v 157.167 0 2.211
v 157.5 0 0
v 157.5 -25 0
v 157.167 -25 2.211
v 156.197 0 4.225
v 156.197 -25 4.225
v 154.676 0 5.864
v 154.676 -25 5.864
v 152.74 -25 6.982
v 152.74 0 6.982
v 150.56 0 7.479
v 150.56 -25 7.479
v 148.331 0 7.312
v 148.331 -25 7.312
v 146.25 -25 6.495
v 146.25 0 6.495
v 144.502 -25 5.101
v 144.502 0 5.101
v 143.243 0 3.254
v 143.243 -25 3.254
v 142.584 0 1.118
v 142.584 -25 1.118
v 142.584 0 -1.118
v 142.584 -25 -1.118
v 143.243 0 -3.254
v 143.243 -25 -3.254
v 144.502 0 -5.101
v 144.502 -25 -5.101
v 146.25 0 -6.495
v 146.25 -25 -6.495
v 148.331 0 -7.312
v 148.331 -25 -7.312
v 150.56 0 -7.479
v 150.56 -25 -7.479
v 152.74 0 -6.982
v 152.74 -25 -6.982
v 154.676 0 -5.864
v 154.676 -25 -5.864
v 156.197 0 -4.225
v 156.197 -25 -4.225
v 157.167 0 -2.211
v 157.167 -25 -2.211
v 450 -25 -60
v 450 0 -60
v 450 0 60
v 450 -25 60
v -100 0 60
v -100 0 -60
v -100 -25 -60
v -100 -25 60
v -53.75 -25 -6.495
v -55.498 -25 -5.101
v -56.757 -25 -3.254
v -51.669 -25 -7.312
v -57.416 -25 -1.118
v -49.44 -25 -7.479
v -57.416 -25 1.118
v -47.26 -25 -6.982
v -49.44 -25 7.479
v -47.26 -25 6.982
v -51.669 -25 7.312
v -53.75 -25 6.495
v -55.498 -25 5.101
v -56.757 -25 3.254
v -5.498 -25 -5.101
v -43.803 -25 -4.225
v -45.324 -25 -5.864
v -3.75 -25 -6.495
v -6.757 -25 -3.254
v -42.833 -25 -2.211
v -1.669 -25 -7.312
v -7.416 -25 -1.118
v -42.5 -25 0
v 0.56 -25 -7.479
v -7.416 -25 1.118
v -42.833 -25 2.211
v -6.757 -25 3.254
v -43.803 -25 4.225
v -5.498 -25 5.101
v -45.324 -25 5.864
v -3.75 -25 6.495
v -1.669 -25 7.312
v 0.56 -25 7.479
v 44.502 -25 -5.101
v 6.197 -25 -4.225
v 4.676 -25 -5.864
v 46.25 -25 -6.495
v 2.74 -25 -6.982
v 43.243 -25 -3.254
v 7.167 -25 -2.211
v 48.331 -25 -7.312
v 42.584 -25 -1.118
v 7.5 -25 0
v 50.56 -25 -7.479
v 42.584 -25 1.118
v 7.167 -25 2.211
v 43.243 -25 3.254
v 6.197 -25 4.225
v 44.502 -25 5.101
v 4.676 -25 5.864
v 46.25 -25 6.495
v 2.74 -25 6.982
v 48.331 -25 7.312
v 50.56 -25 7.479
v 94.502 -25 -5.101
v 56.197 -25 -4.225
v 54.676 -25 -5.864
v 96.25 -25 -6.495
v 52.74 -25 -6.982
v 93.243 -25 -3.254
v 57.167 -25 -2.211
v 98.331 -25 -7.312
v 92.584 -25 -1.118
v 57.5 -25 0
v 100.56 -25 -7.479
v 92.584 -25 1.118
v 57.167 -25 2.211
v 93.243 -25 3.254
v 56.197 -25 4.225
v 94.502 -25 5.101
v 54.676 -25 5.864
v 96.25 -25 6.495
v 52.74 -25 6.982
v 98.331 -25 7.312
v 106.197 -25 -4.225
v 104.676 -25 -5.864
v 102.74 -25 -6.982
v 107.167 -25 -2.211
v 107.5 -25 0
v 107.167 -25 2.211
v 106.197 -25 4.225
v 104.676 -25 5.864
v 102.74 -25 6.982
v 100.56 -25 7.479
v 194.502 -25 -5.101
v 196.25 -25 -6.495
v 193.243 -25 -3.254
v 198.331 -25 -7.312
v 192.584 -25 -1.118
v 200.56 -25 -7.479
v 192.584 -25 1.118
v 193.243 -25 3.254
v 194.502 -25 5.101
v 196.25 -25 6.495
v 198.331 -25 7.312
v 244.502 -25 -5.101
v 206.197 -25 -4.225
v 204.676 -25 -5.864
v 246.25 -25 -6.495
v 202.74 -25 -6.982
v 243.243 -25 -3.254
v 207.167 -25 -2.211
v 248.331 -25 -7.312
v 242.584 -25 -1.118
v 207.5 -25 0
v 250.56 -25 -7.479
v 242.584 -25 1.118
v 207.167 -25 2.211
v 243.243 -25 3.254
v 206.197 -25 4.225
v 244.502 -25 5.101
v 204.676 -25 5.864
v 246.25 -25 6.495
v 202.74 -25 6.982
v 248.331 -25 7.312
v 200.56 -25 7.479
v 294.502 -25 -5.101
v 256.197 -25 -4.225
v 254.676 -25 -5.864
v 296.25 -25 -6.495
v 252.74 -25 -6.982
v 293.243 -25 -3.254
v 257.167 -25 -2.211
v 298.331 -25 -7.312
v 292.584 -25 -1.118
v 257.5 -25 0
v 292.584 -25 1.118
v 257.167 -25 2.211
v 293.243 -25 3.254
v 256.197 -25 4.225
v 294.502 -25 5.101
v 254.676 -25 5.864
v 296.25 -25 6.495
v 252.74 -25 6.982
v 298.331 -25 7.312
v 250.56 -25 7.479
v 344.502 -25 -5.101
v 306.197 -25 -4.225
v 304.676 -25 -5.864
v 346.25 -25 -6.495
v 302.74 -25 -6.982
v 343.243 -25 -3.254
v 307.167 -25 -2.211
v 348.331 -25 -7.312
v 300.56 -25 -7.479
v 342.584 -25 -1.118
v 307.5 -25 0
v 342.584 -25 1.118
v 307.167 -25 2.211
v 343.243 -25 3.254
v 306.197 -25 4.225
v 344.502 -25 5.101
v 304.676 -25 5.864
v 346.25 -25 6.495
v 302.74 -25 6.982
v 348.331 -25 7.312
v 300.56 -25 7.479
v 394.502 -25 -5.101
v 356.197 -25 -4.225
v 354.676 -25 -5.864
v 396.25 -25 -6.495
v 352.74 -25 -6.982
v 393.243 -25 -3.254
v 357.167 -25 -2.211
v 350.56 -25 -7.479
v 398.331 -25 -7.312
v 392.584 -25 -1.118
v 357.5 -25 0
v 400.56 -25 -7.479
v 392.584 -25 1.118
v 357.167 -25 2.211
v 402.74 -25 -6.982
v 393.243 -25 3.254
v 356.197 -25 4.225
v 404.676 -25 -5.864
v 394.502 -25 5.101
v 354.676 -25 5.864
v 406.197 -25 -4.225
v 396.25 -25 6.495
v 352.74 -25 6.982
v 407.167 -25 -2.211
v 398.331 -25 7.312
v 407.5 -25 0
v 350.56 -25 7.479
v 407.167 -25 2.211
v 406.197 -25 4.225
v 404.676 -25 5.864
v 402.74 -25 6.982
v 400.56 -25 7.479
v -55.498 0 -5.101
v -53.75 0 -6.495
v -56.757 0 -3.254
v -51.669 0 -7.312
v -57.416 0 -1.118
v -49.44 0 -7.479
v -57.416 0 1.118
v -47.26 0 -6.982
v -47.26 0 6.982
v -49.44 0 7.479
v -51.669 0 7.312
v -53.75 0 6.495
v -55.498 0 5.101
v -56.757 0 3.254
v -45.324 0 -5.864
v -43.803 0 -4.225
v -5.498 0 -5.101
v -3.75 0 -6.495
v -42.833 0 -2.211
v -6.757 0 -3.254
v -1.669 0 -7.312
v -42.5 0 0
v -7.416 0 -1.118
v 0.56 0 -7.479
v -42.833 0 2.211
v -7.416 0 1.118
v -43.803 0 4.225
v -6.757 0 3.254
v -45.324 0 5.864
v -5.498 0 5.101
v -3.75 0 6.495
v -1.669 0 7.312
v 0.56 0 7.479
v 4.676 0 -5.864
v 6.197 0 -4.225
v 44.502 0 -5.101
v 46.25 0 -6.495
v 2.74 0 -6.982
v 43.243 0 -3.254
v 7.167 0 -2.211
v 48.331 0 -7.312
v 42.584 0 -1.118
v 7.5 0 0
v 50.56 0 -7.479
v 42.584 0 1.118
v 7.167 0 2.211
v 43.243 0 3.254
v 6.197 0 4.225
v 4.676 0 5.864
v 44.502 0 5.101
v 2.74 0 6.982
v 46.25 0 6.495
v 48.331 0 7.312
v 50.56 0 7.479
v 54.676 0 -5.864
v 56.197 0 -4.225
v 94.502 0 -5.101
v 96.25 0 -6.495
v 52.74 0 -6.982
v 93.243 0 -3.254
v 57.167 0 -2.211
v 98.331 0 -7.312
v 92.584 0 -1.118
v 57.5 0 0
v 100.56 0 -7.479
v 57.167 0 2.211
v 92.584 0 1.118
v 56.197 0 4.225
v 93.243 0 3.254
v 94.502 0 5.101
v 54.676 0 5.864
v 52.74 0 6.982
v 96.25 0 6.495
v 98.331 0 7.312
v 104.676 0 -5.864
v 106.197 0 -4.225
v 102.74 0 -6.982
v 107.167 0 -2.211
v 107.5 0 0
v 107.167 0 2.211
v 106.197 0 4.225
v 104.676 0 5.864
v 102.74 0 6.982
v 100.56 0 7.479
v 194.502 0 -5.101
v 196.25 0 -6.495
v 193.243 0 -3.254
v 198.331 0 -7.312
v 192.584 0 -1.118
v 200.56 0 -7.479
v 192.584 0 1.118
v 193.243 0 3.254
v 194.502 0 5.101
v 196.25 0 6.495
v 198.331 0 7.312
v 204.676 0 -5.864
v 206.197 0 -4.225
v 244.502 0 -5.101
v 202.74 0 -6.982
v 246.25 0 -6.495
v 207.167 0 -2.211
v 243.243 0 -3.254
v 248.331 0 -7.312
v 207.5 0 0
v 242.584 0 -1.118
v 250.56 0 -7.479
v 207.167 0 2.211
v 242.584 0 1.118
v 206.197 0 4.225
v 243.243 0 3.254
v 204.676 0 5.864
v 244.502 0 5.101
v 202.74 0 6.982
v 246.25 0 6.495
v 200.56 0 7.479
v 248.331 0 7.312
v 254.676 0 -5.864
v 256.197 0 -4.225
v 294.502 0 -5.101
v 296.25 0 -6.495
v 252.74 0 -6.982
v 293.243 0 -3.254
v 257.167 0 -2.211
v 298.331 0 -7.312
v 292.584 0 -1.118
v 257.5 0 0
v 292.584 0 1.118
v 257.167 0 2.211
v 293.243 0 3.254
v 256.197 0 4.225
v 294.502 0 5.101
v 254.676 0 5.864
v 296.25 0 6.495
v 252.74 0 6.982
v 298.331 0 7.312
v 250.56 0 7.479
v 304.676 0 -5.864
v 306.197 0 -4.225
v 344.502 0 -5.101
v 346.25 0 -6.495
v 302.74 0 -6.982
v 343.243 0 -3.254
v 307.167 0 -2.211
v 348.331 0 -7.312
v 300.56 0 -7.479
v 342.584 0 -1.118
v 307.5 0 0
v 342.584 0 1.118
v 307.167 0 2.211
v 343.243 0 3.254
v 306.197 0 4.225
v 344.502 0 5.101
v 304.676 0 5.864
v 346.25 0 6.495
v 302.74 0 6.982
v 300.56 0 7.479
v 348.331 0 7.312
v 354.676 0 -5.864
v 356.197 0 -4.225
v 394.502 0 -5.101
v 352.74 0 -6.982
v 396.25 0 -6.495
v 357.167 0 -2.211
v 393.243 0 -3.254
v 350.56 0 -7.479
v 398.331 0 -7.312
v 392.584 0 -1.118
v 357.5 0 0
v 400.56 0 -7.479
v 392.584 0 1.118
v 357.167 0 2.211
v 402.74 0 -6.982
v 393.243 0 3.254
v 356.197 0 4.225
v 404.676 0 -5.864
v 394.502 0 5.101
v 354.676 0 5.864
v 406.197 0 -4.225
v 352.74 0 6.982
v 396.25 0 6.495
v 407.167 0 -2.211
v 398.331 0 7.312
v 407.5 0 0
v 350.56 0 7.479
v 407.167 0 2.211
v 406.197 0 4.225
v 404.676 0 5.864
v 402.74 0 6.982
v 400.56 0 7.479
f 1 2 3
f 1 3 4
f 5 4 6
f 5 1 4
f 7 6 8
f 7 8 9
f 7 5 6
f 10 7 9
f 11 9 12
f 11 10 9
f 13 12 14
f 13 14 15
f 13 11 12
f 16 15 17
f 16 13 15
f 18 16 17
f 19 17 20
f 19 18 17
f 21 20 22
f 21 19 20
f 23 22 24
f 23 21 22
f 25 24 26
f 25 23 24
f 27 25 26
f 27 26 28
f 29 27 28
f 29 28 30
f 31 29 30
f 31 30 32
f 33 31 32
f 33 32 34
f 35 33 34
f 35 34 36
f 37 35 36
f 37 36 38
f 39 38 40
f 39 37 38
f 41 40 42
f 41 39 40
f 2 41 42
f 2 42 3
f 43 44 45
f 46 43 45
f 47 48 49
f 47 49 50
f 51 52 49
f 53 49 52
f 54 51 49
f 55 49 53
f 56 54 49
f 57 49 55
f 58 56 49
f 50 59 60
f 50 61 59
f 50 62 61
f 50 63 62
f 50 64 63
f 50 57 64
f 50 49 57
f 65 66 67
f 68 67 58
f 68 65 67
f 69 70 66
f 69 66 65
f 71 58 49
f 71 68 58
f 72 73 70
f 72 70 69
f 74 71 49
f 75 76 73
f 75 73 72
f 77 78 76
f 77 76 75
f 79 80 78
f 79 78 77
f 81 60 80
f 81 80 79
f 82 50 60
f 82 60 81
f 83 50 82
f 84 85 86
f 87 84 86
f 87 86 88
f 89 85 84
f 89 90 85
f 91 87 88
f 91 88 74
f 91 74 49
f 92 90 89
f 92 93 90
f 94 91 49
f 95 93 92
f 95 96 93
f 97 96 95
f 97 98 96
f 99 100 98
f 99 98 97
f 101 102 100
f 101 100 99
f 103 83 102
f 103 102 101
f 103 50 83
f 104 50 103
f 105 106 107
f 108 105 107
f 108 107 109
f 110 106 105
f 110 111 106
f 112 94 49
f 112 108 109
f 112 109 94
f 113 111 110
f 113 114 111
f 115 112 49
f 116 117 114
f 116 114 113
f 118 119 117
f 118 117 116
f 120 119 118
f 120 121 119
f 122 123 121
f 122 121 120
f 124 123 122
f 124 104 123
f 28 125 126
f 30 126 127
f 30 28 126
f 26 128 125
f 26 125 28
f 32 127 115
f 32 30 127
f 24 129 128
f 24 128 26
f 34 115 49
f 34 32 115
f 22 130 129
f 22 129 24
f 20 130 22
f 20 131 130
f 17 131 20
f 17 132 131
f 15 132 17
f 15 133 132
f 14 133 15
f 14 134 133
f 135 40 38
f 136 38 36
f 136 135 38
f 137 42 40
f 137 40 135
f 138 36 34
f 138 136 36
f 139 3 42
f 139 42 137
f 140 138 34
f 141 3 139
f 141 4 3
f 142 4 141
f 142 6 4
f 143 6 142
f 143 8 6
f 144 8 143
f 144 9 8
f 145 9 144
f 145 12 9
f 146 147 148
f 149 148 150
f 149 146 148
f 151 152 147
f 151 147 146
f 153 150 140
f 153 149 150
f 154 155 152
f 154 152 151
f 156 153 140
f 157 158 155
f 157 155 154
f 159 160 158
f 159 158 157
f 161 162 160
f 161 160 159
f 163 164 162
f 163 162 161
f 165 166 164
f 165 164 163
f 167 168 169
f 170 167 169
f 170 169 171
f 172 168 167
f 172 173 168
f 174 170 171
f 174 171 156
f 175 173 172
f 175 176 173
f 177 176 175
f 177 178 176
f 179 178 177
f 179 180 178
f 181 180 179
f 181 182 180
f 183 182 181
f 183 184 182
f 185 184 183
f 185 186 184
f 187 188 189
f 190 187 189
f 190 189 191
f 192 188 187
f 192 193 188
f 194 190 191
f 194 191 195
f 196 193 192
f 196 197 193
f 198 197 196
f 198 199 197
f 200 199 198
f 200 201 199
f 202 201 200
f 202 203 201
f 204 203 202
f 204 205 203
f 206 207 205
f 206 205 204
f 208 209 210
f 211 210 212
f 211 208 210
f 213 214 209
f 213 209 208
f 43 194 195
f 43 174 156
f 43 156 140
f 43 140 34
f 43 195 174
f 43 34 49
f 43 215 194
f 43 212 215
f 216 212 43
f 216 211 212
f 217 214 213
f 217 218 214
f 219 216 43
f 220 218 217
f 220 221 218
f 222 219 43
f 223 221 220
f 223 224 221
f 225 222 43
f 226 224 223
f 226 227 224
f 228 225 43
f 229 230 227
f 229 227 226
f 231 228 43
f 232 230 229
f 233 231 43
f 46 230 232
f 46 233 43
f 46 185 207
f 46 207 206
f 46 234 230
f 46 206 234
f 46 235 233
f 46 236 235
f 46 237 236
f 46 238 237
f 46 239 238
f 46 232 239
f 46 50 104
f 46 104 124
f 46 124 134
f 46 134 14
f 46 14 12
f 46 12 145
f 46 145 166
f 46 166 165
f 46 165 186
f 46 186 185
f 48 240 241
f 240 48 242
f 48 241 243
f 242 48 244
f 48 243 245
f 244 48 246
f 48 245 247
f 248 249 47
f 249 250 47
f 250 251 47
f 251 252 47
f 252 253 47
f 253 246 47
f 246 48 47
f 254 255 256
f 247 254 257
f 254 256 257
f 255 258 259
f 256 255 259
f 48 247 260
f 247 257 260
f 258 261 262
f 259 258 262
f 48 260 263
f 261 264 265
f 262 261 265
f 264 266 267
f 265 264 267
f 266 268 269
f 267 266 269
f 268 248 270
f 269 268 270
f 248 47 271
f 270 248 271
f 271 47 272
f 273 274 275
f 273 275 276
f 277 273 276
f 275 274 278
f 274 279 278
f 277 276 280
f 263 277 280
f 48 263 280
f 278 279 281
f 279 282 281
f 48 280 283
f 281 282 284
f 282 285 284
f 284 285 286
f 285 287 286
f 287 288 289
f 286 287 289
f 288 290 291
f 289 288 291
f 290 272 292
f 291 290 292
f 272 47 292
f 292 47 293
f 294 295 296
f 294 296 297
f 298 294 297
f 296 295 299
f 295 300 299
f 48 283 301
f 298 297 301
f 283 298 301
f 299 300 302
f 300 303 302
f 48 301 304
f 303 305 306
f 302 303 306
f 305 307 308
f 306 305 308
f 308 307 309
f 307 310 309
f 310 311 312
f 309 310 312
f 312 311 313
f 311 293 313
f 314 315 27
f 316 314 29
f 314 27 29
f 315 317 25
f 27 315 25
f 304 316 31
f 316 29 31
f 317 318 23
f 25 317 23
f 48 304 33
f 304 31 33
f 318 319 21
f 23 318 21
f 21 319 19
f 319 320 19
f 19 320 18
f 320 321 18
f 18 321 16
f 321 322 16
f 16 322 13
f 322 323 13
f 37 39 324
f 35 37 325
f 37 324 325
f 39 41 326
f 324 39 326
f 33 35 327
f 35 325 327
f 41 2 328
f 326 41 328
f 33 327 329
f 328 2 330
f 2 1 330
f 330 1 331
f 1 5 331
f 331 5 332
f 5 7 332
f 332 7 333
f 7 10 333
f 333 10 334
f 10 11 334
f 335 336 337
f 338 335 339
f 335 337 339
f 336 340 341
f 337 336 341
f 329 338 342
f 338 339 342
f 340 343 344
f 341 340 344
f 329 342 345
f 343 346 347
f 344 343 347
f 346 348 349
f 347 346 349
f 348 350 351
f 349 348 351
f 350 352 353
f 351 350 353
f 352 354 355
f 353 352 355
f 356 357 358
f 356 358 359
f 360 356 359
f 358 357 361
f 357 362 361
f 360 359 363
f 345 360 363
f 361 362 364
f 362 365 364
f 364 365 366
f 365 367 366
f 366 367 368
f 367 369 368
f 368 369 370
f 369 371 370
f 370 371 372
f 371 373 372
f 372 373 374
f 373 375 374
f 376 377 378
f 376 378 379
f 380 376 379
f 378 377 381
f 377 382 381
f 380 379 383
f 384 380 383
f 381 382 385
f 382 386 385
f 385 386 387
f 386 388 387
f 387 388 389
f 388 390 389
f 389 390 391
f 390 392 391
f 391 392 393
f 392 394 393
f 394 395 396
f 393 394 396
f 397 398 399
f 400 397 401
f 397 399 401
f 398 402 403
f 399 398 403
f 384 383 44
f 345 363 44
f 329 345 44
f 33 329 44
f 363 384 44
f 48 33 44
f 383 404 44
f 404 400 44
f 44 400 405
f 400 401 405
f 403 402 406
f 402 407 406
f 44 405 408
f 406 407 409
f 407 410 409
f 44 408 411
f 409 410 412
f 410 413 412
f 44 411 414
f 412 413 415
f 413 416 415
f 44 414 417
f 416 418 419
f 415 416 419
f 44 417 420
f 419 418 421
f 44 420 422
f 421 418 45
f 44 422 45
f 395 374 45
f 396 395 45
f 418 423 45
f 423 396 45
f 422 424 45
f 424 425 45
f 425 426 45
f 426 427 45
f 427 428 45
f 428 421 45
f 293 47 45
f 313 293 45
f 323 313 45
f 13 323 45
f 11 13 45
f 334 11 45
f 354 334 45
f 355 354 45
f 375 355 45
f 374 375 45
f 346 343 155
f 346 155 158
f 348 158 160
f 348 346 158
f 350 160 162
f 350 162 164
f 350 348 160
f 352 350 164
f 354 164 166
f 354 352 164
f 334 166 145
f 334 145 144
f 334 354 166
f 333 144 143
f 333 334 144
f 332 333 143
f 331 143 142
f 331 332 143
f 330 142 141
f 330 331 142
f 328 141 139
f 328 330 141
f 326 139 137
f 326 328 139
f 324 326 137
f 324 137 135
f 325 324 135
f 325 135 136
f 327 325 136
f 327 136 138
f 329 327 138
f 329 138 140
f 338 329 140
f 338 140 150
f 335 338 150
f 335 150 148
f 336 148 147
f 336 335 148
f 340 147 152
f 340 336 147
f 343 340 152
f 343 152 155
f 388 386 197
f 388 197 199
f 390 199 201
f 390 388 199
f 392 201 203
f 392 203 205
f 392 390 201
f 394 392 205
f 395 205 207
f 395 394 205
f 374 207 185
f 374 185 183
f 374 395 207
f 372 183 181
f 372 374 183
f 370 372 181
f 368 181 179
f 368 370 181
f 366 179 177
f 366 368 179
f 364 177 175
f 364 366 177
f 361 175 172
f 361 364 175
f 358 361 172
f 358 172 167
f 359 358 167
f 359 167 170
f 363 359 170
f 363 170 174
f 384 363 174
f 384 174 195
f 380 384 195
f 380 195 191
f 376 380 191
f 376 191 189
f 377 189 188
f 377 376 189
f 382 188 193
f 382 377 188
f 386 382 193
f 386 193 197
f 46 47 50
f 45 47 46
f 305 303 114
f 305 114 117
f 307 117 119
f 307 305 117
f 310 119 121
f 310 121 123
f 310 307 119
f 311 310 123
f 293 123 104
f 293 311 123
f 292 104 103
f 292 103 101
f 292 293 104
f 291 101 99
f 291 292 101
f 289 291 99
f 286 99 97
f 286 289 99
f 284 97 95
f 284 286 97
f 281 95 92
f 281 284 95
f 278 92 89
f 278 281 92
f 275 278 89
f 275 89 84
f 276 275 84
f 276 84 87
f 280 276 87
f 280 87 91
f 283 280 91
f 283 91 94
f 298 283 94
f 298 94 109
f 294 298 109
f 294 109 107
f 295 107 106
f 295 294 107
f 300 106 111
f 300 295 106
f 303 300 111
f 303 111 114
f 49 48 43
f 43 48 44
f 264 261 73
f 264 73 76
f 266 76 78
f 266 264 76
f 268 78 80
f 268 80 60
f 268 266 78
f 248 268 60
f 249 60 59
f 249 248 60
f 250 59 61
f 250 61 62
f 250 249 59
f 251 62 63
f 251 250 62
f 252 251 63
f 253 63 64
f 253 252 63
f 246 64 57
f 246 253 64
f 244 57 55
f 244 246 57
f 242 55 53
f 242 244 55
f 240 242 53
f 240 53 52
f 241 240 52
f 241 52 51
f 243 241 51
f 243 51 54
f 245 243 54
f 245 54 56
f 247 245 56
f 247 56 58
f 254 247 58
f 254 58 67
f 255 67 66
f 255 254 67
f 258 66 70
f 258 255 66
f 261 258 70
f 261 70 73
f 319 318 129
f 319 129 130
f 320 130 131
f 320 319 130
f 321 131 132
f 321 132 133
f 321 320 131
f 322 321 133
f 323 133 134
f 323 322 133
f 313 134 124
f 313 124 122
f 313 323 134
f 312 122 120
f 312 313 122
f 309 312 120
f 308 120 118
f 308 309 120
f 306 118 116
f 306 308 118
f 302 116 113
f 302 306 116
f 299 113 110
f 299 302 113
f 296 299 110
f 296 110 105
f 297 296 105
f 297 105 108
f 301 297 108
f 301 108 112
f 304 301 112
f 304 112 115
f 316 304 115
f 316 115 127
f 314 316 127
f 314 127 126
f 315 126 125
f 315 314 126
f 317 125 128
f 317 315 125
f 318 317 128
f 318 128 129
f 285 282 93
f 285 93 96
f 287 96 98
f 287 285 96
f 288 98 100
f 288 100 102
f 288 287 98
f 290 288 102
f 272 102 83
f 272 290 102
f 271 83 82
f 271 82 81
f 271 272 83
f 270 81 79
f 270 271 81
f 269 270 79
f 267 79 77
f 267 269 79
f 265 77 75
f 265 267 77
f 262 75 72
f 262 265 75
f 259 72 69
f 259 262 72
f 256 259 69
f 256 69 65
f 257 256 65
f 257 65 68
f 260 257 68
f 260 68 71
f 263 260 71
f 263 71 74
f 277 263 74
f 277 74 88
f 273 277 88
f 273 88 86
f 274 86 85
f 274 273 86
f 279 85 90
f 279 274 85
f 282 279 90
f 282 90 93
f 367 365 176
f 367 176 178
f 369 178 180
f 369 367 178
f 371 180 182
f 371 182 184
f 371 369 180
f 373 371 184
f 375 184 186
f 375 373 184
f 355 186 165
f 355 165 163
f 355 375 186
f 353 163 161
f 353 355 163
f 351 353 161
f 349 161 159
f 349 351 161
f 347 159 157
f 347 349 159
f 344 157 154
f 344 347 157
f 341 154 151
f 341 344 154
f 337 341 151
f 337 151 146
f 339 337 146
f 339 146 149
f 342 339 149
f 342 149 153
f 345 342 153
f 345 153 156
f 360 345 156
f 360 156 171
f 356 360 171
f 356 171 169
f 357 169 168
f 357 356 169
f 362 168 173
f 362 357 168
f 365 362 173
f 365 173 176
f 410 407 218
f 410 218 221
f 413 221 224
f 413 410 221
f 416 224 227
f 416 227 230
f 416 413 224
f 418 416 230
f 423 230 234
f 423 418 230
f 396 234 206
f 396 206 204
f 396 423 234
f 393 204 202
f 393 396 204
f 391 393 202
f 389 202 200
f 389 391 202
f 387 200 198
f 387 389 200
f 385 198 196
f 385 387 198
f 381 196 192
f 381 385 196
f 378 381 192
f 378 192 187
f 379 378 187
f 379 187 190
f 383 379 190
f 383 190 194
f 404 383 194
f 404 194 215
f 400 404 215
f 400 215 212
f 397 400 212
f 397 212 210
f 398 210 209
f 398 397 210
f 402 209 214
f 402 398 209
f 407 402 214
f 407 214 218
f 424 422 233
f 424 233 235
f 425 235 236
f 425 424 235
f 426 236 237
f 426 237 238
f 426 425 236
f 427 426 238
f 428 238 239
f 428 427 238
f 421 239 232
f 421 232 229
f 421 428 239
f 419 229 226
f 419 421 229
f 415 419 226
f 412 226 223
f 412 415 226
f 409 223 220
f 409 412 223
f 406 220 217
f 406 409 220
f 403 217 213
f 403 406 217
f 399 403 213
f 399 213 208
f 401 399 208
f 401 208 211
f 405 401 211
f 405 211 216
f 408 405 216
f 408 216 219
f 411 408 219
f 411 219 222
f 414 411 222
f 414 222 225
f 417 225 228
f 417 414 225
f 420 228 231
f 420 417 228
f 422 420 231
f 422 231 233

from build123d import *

# Parameters (mm, degrees)
F0_W     = 550
F0_H     = 120
F0_R     = 7.5
F1_DEPTH = 25


with BuildPart() as f1:
    # F0 (on Front) → F1 (new body)
    with BuildSketch(Plane.XZ):
        with Locations((175, 0)):
            Rectangle(F0_W, F0_H)
        with Locations((-50, 0)):
            Circle(F0_R, mode=Mode.SUBTRACT)
        Circle(F0_R, mode=Mode.SUBTRACT)
        with Locations((50, 0)):
            Circle(F0_R, mode=Mode.SUBTRACT)
        with Locations((100, 0)):
            Circle(F0_R, mode=Mode.SUBTRACT)
        with Locations((150, 0)):
            Circle(F0_R, mode=Mode.SUBTRACT)
        with Locations((200, 0)):
            Circle(F0_R, mode=Mode.SUBTRACT)
        with Locations((250, 0)):
            Circle(F0_R, mode=Mode.SUBTRACT)
        with Locations((300, 0)):
            Circle(F0_R, mode=Mode.SUBTRACT)
        with Locations((350, 0)):
            Circle(F0_R, mode=Mode.SUBTRACT)
        with Locations((400, 0)):
            Circle(F0_R, mode=Mode.SUBTRACT)
    extrude(amount=F1_DEPTH)


solid = f1.part
